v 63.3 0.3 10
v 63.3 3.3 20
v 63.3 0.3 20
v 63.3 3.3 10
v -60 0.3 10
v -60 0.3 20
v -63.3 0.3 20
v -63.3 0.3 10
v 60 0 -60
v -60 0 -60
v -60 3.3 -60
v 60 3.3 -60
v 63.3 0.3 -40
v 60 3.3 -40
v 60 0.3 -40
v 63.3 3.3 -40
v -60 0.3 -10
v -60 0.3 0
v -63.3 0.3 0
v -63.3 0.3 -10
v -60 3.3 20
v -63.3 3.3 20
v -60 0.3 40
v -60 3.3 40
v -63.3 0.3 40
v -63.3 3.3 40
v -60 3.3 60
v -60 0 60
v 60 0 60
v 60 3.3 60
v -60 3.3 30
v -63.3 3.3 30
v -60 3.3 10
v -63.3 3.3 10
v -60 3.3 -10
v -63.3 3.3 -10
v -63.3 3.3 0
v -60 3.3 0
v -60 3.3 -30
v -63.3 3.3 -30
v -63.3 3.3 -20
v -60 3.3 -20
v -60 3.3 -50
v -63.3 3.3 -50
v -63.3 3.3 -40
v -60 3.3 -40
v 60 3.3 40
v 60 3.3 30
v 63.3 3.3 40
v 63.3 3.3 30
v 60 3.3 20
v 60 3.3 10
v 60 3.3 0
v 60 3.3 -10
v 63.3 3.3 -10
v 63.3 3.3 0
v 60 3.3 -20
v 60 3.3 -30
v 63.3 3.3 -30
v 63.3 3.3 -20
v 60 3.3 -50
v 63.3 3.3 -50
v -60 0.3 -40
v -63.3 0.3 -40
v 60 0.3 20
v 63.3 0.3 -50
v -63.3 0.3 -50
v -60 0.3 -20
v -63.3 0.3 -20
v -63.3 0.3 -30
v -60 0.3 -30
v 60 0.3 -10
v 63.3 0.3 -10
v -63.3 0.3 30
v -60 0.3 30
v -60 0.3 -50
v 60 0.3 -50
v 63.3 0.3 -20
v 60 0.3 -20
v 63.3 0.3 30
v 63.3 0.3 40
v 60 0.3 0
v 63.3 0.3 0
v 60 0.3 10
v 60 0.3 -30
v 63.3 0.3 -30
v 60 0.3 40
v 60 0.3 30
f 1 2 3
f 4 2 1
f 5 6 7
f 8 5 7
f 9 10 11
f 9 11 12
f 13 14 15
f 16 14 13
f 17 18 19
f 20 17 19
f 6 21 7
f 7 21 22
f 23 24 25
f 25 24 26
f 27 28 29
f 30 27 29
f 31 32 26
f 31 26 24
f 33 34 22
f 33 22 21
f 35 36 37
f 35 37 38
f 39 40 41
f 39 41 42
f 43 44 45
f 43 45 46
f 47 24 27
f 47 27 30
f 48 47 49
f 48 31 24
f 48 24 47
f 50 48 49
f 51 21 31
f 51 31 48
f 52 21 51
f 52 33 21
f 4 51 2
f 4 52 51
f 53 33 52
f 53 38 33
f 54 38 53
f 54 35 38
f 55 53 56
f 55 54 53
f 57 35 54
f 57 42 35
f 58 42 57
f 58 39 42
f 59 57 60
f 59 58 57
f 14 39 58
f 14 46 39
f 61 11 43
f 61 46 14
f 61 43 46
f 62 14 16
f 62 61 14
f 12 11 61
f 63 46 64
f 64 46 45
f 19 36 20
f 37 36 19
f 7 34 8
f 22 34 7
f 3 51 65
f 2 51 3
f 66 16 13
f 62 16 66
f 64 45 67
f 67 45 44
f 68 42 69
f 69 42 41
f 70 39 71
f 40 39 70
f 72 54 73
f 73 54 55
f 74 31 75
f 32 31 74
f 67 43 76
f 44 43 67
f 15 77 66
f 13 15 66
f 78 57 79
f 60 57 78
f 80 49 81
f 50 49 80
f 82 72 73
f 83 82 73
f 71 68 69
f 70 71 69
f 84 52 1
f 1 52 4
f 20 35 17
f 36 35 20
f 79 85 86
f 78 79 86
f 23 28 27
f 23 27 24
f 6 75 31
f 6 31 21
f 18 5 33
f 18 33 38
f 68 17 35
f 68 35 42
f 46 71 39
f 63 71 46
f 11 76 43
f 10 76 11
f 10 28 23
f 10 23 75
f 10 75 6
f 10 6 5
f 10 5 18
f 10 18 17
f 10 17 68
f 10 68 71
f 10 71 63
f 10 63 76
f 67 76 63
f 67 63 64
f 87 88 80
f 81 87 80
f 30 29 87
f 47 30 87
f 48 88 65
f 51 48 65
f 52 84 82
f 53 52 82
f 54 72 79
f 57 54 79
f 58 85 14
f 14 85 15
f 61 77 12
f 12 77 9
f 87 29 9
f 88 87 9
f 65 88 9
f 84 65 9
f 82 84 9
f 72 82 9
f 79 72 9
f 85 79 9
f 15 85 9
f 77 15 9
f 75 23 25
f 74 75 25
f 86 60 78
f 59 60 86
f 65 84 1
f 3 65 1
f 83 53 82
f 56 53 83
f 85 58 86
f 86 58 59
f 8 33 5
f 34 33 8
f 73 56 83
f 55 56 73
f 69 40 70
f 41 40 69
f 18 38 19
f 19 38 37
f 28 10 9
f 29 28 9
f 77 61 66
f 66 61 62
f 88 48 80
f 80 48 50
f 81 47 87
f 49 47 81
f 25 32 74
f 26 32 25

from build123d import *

# Parameters (mm, degrees)
SKETCH1_W               = 120
SKETCH1_H               = 120
BOSS_EXTRUDE1_DEPTH     = 3.3
SKETCH2_W               = 3.3
SKETCH2_H               = 10
BOSS_EXTRUDE2_DEPTH     = 3
LPATTERN1_COUNT         = 5
LPATTERN1_PITCH         = 20
MIRROR1_COPY_1_SKETCH_W = 3.3
MIRROR1_COPY_1_SKETCH_H = 10
MIRROR1_COPY_1_DEPTH    = 3
MIRROR1_COPY_2_SKETCH_W = 3.3
MIRROR1_COPY_2_SKETCH_H = 10
MIRROR1_COPY_2_DEPTH    = 3
MIRROR1_COPY_3_SKETCH_W = 3.3
MIRROR1_COPY_3_SKETCH_H = 10
MIRROR1_COPY_3_DEPTH    = 3
MIRROR1_COPY_4_SKETCH_W = 3.3
MIRROR1_COPY_4_SKETCH_H = 10
MIRROR1_COPY_4_DEPTH    = 3


with BuildPart() as part:
    # Sketch1 → Boss-Extrude1 (new body)
    with BuildSketch(Plane(origin=(0, 0, 0), x_dir=(1, 0, 0), z_dir=(0, 1, 0))):
        Rectangle(SKETCH1_W, SKETCH1_H)
    extrude(amount=BOSS_EXTRUDE1_DEPTH)

    # Sketch2 → Boss-Extrude2 (add)
    with BuildSketch(Plane(origin=(0, 3.3, 0), x_dir=(1, 0, 0), z_dir=(0, 1, 0))):
        with Locations((61.65, 45)):
            Rectangle(SKETCH2_W, SKETCH2_H)
    boss_extrude2 = extrude(amount=-BOSS_EXTRUDE2_DEPTH)

    # LPattern1: Boss-Extrude2 ×5
    with Locations(*[(0, 0, i * LPATTERN1_PITCH) for i in range(1, LPATTERN1_COUNT)]):
        add(boss_extrude2)

    # Mirror1: Boss-Extrude2 across plane
    add(boss_extrude2.mirror(Plane(origin=(0, 0, 0), x_dir=(0, 0, 1), z_dir=(1, 0, 0))))

    # Mirror1 copy 1 sketch → Mirror1 copy 1 (add)
    with BuildSketch(Plane(origin=(0, 3.3, 20), x_dir=(-1, 0, 0), z_dir=(0, 1, 0))):
        with Locations((61.65, -45)):
            Rectangle(MIRROR1_COPY_1_SKETCH_W, MIRROR1_COPY_1_SKETCH_H)
    extrude(amount=-MIRROR1_COPY_1_DEPTH)

    # Mirror1 copy 2 sketch → Mirror1 copy 2 (add)
    with BuildSketch(Plane(origin=(0, 3.3, 40), x_dir=(-1, 0, 0), z_dir=(0, 1, 0))):
        with Locations((61.65, -45)):
            Rectangle(MIRROR1_COPY_2_SKETCH_W, MIRROR1_COPY_2_SKETCH_H)
    extrude(amount=-MIRROR1_COPY_2_DEPTH)

    # Mirror1 copy 3 sketch → Mirror1 copy 3 (add)
    with BuildSketch(Plane(origin=(0, 3.3, 60), x_dir=(-1, 0, 0), z_dir=(0, 1, 0))):
        with Locations((61.65, -45)):
            Rectangle(MIRROR1_COPY_3_SKETCH_W, MIRROR1_COPY_3_SKETCH_H)
    extrude(amount=-MIRROR1_COPY_3_DEPTH)

    # Mirror1 copy 4 sketch → Mirror1 copy 4 (add)
    with BuildSketch(Plane(origin=(0, 3.3, 80), x_dir=(-1, 0, 0), z_dir=(0, 1, 0))):
        with Locations((61.65, -45)):
            Rectangle(MIRROR1_COPY_4_SKETCH_W, MIRROR1_COPY_4_SKETCH_H)
    extrude(amount=-MIRROR1_COPY_4_DEPTH)


solid = part.part
